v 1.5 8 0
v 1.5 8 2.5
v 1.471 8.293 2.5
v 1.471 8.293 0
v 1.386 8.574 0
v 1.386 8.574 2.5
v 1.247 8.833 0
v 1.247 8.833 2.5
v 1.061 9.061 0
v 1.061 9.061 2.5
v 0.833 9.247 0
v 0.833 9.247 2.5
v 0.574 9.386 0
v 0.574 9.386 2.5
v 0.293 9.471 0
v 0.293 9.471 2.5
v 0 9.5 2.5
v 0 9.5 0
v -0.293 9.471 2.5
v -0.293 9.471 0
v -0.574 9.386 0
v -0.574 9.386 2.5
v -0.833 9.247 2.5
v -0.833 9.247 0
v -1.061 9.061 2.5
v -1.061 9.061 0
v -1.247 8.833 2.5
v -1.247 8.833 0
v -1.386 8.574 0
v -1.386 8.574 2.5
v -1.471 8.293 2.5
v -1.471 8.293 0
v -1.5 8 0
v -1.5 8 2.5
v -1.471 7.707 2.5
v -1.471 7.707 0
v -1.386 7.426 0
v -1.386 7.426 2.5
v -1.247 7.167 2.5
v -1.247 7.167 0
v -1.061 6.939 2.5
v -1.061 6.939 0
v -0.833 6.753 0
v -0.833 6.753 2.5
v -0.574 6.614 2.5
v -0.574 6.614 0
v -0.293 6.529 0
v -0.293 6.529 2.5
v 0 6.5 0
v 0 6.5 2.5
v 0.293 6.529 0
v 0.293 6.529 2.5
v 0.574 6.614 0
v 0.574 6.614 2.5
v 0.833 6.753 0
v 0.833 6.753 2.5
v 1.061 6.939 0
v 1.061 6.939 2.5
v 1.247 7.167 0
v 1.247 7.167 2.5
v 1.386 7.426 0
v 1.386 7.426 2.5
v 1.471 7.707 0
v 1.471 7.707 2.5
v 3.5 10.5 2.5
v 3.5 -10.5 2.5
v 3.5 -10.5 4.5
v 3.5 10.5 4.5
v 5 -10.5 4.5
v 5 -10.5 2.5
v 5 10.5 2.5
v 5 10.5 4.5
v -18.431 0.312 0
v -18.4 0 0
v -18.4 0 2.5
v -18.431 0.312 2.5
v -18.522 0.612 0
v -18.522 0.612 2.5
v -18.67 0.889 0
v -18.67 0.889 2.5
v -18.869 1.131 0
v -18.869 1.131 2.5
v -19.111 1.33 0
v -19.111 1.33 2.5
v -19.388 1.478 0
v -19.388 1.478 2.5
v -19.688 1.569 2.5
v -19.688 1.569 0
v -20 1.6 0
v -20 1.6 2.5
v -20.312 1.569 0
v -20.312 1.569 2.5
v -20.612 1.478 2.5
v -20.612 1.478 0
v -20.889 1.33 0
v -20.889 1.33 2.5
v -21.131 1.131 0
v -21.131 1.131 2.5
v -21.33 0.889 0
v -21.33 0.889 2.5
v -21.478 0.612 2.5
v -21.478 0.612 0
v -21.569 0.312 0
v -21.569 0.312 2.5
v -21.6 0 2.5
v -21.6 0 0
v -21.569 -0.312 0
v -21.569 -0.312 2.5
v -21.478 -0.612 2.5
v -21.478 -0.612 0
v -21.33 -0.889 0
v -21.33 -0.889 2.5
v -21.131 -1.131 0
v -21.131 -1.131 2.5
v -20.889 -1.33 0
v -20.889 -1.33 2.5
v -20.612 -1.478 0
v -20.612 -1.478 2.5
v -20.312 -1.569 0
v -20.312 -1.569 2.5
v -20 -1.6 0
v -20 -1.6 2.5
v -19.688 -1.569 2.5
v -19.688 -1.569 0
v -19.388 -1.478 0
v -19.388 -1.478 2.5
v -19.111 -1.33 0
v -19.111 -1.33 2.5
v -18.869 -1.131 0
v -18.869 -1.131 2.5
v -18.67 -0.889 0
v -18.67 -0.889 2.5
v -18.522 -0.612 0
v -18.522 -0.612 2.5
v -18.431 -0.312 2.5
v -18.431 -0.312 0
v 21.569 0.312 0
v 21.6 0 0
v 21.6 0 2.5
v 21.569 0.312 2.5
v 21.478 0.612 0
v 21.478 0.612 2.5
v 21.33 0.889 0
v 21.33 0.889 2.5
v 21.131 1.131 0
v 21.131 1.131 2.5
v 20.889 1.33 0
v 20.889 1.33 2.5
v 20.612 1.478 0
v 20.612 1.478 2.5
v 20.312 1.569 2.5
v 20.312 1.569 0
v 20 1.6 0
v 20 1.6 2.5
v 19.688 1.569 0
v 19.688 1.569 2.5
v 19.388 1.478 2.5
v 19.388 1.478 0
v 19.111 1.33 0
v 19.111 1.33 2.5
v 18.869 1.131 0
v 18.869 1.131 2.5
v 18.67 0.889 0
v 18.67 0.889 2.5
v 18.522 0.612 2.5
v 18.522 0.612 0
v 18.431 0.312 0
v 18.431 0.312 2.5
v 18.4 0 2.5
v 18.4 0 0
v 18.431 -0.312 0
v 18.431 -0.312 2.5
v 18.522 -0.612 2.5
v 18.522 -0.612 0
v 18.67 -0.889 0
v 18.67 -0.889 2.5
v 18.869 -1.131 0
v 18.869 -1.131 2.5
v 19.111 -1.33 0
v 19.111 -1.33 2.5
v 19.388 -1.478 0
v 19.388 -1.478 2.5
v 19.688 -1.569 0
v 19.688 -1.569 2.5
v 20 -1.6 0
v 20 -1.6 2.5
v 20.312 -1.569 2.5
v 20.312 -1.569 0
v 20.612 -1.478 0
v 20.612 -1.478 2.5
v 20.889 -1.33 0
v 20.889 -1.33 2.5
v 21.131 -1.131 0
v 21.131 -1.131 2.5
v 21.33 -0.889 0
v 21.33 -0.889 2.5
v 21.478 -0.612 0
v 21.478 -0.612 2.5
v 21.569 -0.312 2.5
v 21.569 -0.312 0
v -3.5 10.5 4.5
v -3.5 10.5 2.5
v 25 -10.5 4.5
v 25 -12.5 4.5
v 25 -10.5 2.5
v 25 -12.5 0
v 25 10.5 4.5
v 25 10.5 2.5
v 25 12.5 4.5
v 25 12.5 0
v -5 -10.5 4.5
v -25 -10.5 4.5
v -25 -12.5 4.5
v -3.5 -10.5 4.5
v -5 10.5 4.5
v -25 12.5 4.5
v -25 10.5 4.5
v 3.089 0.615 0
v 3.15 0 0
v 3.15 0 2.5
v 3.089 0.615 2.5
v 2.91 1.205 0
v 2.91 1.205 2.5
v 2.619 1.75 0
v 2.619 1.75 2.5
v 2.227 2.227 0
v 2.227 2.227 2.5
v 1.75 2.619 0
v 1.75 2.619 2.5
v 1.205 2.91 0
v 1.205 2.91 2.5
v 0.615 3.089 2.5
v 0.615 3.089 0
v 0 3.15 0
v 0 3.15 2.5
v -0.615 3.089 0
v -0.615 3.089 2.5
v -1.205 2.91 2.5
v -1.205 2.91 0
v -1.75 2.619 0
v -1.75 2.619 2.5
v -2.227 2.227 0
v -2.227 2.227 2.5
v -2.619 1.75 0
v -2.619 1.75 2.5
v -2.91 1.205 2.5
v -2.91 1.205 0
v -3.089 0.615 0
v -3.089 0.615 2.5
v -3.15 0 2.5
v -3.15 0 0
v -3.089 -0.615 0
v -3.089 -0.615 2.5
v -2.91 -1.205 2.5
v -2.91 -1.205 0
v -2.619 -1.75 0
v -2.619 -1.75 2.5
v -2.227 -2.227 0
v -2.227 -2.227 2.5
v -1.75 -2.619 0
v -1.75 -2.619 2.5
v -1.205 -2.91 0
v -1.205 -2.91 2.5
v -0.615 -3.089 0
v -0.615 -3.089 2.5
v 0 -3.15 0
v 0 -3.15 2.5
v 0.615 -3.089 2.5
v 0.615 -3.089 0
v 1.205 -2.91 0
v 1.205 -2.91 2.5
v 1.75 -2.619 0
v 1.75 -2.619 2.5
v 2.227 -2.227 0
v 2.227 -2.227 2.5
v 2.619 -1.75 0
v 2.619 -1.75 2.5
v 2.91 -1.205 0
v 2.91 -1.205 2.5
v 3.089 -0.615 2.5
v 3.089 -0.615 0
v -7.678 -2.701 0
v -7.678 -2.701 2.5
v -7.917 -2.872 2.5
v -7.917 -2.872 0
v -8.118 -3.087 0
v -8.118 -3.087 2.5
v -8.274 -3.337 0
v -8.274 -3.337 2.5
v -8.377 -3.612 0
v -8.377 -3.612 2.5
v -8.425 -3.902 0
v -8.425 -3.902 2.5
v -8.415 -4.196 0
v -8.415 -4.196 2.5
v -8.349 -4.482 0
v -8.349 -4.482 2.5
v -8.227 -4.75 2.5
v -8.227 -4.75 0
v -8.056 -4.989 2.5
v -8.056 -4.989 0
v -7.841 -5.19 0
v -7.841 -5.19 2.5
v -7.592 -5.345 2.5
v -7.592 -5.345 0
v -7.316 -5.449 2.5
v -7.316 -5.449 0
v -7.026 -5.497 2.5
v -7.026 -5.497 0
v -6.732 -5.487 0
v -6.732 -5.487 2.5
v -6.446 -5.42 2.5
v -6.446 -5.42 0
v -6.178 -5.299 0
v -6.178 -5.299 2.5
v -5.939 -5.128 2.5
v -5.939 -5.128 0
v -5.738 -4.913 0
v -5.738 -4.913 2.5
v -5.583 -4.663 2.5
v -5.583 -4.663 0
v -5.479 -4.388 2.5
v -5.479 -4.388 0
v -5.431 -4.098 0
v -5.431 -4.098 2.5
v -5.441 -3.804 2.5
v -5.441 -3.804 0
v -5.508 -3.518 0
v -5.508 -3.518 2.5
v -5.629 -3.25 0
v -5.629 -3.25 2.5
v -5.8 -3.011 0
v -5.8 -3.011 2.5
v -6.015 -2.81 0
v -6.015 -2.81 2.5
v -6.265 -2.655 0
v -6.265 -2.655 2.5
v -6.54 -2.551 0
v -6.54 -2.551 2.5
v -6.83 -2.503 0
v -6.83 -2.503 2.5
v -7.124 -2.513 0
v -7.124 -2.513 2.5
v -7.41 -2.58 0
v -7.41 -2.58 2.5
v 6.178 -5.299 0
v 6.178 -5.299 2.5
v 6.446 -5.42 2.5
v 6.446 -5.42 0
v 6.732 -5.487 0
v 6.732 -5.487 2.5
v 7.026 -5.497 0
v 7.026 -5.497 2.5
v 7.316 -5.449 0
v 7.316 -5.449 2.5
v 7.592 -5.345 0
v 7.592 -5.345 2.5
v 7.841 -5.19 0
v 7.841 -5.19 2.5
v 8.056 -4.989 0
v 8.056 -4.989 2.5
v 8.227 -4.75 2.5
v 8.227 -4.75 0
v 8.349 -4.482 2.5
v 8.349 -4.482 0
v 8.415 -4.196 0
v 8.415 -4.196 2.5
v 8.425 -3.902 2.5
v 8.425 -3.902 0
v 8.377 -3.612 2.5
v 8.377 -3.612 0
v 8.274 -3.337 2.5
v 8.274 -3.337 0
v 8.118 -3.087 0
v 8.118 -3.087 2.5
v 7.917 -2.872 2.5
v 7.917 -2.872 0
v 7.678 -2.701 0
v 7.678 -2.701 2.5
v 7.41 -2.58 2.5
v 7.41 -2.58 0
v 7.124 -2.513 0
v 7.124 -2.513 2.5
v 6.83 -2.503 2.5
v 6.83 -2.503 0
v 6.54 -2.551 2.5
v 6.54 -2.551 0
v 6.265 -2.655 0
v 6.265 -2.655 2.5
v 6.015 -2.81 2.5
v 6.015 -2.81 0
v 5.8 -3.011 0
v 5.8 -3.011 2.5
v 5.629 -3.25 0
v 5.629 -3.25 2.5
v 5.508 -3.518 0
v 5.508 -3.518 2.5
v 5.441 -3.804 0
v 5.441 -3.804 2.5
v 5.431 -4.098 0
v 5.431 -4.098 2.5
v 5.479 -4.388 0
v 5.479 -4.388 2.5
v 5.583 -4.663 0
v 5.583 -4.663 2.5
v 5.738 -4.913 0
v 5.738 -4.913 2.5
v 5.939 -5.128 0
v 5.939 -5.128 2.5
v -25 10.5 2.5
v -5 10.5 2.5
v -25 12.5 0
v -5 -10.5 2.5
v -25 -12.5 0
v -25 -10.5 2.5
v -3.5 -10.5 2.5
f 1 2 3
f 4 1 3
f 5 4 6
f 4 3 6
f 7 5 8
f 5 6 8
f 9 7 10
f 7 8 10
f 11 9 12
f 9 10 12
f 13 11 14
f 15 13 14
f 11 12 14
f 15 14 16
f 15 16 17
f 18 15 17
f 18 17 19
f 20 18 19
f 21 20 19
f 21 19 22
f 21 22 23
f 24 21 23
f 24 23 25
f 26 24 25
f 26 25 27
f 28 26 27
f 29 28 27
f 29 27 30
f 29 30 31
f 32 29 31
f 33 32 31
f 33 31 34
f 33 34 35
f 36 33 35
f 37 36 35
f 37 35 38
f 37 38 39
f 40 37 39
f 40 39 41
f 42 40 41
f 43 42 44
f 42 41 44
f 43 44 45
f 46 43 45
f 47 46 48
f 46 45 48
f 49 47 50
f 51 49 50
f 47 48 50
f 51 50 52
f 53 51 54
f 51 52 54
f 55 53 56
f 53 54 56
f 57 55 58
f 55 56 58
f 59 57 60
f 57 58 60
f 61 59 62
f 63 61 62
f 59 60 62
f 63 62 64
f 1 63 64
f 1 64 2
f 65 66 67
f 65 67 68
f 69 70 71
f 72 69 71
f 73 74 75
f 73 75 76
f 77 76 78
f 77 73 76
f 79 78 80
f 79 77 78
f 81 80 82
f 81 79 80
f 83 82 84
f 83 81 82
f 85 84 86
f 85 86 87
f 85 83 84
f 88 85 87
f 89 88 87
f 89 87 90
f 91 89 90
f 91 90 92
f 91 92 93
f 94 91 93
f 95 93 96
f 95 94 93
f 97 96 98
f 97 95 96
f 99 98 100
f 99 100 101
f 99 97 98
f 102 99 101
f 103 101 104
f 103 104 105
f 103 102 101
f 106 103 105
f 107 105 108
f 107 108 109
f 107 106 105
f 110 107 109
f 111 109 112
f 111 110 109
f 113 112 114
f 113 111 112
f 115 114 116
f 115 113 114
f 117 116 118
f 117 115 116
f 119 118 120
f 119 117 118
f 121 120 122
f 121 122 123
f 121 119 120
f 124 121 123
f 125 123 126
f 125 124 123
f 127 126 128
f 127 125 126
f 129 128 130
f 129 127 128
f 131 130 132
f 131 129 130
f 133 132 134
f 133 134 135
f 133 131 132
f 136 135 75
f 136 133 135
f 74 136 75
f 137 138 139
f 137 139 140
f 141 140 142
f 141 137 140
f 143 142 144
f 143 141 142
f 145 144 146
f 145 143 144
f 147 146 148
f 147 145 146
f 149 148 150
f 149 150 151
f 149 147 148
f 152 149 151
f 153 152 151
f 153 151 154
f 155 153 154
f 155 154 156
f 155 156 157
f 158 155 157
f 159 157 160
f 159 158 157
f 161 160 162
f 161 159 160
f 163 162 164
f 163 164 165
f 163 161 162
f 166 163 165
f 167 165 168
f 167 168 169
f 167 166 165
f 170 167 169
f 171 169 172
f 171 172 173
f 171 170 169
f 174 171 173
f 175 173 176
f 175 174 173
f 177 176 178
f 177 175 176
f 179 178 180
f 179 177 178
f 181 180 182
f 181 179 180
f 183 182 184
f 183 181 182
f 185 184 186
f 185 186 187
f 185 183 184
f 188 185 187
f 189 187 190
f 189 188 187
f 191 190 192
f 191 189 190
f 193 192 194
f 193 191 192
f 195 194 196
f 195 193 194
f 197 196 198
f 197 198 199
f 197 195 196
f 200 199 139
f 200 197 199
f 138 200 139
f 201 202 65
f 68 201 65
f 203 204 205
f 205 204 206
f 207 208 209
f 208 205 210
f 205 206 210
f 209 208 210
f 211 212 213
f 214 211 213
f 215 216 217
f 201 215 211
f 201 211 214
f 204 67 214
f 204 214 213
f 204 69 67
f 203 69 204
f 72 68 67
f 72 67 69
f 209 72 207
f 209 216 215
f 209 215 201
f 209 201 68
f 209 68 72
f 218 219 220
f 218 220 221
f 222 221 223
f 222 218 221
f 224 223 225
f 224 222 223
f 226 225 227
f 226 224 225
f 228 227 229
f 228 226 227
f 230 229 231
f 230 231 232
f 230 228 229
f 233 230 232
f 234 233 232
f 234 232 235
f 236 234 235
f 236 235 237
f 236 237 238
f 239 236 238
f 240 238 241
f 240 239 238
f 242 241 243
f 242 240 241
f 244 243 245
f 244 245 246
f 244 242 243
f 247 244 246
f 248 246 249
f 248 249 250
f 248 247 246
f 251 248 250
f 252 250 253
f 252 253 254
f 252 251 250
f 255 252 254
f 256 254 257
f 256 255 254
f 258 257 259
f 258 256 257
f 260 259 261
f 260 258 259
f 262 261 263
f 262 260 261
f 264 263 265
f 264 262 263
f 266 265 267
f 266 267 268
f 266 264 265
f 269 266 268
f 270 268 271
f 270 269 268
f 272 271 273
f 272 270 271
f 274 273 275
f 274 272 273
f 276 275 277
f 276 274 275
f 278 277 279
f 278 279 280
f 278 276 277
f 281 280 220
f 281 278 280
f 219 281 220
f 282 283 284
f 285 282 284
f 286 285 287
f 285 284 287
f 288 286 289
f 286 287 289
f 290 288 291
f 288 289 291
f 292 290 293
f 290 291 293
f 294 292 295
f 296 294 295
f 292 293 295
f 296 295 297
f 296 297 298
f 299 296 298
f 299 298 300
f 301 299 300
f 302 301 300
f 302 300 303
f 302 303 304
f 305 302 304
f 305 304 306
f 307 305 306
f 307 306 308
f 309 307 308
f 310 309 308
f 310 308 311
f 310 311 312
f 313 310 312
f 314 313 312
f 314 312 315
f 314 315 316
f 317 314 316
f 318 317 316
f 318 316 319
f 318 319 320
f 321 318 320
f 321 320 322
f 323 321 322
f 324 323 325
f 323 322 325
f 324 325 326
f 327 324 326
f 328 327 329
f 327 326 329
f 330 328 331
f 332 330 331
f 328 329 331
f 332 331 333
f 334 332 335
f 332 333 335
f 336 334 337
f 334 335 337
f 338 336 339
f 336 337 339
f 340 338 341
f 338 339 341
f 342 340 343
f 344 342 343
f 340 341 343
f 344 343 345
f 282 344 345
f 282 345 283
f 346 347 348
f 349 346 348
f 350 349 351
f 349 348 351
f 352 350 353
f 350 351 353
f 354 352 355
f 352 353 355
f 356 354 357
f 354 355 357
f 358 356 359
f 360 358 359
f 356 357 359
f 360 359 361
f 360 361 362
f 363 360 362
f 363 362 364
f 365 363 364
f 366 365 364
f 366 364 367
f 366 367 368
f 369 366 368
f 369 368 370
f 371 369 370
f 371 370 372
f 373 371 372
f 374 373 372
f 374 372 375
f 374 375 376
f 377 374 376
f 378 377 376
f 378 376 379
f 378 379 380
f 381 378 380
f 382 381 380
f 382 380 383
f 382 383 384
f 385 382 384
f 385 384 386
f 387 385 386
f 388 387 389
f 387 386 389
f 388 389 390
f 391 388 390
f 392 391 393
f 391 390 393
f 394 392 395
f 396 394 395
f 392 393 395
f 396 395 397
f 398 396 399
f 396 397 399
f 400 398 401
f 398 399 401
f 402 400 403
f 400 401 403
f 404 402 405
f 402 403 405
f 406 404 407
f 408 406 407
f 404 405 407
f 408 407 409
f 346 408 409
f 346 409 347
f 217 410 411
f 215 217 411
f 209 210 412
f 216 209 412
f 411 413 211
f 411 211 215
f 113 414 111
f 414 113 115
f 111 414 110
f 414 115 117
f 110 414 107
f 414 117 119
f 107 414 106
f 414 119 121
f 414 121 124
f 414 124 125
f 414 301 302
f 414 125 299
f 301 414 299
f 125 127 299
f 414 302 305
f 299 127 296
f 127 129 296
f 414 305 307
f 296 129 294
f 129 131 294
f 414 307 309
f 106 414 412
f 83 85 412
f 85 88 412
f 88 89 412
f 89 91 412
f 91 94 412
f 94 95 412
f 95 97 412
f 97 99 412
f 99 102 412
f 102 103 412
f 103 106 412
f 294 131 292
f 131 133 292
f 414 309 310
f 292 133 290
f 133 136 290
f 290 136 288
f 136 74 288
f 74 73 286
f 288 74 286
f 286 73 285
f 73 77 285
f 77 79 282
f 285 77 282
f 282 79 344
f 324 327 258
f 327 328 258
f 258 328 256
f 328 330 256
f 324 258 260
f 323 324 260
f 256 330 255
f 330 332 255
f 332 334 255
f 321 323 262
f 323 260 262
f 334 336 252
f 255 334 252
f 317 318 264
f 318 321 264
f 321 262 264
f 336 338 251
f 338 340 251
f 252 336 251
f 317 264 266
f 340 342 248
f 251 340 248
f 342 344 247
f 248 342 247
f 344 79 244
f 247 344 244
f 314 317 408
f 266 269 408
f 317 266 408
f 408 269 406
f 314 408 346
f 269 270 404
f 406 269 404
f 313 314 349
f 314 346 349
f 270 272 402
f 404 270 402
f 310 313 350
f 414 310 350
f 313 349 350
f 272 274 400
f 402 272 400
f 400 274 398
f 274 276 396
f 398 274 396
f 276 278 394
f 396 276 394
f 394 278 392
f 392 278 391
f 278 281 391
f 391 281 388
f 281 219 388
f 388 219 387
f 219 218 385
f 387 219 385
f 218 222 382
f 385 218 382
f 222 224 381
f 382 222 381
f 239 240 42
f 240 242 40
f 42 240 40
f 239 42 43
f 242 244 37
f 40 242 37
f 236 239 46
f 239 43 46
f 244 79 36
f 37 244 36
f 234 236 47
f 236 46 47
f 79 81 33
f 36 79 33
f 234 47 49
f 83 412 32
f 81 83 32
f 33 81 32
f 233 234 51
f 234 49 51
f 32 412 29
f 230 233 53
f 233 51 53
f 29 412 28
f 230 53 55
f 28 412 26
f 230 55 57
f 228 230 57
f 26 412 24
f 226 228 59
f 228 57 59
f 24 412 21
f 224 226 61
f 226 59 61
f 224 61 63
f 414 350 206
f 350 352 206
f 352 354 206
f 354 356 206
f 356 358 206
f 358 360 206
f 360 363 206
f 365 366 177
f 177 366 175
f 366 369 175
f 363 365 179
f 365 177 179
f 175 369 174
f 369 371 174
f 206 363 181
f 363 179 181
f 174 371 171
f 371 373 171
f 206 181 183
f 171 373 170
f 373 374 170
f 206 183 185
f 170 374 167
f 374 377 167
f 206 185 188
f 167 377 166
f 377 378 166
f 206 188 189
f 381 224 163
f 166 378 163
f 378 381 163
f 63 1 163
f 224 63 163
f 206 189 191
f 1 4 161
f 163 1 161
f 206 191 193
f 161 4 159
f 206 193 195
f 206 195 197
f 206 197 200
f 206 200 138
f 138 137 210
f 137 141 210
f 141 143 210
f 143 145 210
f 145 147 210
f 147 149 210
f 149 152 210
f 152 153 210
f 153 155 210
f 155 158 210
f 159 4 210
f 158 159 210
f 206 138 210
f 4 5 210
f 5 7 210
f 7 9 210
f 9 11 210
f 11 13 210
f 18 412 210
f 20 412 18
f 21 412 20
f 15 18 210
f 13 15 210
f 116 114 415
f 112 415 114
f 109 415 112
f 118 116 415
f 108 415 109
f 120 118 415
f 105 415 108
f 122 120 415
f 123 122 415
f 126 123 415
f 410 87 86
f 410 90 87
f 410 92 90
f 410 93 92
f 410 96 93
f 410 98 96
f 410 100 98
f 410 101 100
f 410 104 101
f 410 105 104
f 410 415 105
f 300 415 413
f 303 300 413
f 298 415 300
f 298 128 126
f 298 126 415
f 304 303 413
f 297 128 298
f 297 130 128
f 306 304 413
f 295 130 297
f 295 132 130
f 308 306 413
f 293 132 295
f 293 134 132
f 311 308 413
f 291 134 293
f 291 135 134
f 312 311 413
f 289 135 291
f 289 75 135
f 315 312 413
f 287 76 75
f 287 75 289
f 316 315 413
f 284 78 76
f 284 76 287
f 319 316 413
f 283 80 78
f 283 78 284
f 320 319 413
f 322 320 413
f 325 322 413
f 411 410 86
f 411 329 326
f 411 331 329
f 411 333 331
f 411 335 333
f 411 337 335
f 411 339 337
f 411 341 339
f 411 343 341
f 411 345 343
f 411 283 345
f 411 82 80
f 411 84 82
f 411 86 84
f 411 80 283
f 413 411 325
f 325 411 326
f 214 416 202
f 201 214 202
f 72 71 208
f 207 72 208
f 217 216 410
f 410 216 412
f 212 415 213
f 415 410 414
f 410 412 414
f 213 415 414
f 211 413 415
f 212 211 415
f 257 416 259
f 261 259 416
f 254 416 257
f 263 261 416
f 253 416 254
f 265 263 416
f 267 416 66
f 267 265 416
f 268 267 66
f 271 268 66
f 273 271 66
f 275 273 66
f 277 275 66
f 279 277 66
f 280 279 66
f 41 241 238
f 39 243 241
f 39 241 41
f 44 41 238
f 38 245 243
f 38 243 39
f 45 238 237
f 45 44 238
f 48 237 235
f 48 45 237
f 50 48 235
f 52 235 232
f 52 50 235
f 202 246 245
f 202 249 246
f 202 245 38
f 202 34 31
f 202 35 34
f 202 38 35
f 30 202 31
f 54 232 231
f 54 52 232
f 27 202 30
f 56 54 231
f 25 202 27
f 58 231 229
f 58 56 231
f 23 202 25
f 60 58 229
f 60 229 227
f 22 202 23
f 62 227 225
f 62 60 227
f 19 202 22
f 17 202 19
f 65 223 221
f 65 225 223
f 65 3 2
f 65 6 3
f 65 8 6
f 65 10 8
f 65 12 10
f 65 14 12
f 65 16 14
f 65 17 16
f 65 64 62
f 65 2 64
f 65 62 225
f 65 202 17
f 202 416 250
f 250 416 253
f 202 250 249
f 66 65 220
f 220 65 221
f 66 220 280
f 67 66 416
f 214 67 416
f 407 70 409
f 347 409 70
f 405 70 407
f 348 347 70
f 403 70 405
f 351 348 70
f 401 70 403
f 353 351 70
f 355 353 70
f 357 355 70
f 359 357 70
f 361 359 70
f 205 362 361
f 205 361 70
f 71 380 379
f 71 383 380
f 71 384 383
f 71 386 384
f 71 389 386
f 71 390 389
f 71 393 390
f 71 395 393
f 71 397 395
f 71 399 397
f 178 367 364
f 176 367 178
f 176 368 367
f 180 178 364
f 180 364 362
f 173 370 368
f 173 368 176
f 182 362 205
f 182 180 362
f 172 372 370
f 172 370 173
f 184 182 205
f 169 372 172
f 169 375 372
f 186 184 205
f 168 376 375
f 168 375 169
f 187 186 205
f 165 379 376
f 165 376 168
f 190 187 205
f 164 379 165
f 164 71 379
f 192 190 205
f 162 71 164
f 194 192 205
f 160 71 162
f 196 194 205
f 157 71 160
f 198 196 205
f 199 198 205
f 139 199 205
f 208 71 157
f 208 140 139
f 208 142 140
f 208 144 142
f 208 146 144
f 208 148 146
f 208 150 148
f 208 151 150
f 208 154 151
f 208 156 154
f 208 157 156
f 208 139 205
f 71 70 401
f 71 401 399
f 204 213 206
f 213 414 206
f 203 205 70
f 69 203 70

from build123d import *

# Parameters (mm, degrees)
F0_W            = 50
F0_H            = 25
F0_R            = 1.6
F0_R_2          = 3.15
F1_DEPTH        = 2.5
F2_R            = 1.5
F3_DEPTH        = 25
F3_COPIES_COUNT = 3
F4_W            = 1.5
F4_H            = 21
F5_DEPTH        = 2


# Not quite as in the source:
# - a pattern or mirror of a feature is missing from the dataset's text; its kind, count and spacing are read off the source's solid


with BuildPart() as f1:
    # F0 (on Top) → F1 (new body)
    with BuildSketch(Plane.XY):
        Rectangle(F0_W, F0_H)
        with Locations((-20, 0)):
            Circle(F0_R, mode=Mode.SUBTRACT)
        Circle(F0_R_2, mode=Mode.SUBTRACT)
        with Locations((20, 0)):
            Circle(F0_R, mode=Mode.SUBTRACT)
    extrude(amount=F1_DEPTH)

    # F2 (on face) → F3 (cut)
    with BuildSketch(Plane.XY.offset(2.5)):
        with Locations((0, 8)):
            Circle(F2_R)
    f3 = extrude(amount=-F3_DEPTH, mode=Mode.SUBTRACT)

    # F3_copies: F3 ×3 about axis
    f3_copies_axis = Axis((0, 0, 0), (0, 0, 1))
    for i in range(1, F3_COPIES_COUNT):
        add(f3.rotate(f3_copies_axis, i * 360 / F3_COPIES_COUNT), mode=Mode.SUBTRACT)

    # F4 (on face) → F5 (join)
    with BuildSketch(Plane.XY.offset(2.5)):
        Polygon((25, 12.5), (-25, 12.5), (-25, 10.5), (-5, 10.5), (-3.5, 10.5), (3.5, 10.5), (5, 10.5), (25, 10.5), align=None)
        with Locations((-4.25, 0)):
            Rectangle(F4_W, F4_H)
        with Locations((4.25, 0)):
            Rectangle(F4_W, F4_H)
        Polygon((-3.5, -10.5), (-5, -10.5), (-25, -10.5), (-25, -12.5), (25, -12.5), (25, -10.5), (5, -10.5), (3.5, -10.5), align=None)
    extrude(amount=F5_DEPTH)


solid = f1.part
